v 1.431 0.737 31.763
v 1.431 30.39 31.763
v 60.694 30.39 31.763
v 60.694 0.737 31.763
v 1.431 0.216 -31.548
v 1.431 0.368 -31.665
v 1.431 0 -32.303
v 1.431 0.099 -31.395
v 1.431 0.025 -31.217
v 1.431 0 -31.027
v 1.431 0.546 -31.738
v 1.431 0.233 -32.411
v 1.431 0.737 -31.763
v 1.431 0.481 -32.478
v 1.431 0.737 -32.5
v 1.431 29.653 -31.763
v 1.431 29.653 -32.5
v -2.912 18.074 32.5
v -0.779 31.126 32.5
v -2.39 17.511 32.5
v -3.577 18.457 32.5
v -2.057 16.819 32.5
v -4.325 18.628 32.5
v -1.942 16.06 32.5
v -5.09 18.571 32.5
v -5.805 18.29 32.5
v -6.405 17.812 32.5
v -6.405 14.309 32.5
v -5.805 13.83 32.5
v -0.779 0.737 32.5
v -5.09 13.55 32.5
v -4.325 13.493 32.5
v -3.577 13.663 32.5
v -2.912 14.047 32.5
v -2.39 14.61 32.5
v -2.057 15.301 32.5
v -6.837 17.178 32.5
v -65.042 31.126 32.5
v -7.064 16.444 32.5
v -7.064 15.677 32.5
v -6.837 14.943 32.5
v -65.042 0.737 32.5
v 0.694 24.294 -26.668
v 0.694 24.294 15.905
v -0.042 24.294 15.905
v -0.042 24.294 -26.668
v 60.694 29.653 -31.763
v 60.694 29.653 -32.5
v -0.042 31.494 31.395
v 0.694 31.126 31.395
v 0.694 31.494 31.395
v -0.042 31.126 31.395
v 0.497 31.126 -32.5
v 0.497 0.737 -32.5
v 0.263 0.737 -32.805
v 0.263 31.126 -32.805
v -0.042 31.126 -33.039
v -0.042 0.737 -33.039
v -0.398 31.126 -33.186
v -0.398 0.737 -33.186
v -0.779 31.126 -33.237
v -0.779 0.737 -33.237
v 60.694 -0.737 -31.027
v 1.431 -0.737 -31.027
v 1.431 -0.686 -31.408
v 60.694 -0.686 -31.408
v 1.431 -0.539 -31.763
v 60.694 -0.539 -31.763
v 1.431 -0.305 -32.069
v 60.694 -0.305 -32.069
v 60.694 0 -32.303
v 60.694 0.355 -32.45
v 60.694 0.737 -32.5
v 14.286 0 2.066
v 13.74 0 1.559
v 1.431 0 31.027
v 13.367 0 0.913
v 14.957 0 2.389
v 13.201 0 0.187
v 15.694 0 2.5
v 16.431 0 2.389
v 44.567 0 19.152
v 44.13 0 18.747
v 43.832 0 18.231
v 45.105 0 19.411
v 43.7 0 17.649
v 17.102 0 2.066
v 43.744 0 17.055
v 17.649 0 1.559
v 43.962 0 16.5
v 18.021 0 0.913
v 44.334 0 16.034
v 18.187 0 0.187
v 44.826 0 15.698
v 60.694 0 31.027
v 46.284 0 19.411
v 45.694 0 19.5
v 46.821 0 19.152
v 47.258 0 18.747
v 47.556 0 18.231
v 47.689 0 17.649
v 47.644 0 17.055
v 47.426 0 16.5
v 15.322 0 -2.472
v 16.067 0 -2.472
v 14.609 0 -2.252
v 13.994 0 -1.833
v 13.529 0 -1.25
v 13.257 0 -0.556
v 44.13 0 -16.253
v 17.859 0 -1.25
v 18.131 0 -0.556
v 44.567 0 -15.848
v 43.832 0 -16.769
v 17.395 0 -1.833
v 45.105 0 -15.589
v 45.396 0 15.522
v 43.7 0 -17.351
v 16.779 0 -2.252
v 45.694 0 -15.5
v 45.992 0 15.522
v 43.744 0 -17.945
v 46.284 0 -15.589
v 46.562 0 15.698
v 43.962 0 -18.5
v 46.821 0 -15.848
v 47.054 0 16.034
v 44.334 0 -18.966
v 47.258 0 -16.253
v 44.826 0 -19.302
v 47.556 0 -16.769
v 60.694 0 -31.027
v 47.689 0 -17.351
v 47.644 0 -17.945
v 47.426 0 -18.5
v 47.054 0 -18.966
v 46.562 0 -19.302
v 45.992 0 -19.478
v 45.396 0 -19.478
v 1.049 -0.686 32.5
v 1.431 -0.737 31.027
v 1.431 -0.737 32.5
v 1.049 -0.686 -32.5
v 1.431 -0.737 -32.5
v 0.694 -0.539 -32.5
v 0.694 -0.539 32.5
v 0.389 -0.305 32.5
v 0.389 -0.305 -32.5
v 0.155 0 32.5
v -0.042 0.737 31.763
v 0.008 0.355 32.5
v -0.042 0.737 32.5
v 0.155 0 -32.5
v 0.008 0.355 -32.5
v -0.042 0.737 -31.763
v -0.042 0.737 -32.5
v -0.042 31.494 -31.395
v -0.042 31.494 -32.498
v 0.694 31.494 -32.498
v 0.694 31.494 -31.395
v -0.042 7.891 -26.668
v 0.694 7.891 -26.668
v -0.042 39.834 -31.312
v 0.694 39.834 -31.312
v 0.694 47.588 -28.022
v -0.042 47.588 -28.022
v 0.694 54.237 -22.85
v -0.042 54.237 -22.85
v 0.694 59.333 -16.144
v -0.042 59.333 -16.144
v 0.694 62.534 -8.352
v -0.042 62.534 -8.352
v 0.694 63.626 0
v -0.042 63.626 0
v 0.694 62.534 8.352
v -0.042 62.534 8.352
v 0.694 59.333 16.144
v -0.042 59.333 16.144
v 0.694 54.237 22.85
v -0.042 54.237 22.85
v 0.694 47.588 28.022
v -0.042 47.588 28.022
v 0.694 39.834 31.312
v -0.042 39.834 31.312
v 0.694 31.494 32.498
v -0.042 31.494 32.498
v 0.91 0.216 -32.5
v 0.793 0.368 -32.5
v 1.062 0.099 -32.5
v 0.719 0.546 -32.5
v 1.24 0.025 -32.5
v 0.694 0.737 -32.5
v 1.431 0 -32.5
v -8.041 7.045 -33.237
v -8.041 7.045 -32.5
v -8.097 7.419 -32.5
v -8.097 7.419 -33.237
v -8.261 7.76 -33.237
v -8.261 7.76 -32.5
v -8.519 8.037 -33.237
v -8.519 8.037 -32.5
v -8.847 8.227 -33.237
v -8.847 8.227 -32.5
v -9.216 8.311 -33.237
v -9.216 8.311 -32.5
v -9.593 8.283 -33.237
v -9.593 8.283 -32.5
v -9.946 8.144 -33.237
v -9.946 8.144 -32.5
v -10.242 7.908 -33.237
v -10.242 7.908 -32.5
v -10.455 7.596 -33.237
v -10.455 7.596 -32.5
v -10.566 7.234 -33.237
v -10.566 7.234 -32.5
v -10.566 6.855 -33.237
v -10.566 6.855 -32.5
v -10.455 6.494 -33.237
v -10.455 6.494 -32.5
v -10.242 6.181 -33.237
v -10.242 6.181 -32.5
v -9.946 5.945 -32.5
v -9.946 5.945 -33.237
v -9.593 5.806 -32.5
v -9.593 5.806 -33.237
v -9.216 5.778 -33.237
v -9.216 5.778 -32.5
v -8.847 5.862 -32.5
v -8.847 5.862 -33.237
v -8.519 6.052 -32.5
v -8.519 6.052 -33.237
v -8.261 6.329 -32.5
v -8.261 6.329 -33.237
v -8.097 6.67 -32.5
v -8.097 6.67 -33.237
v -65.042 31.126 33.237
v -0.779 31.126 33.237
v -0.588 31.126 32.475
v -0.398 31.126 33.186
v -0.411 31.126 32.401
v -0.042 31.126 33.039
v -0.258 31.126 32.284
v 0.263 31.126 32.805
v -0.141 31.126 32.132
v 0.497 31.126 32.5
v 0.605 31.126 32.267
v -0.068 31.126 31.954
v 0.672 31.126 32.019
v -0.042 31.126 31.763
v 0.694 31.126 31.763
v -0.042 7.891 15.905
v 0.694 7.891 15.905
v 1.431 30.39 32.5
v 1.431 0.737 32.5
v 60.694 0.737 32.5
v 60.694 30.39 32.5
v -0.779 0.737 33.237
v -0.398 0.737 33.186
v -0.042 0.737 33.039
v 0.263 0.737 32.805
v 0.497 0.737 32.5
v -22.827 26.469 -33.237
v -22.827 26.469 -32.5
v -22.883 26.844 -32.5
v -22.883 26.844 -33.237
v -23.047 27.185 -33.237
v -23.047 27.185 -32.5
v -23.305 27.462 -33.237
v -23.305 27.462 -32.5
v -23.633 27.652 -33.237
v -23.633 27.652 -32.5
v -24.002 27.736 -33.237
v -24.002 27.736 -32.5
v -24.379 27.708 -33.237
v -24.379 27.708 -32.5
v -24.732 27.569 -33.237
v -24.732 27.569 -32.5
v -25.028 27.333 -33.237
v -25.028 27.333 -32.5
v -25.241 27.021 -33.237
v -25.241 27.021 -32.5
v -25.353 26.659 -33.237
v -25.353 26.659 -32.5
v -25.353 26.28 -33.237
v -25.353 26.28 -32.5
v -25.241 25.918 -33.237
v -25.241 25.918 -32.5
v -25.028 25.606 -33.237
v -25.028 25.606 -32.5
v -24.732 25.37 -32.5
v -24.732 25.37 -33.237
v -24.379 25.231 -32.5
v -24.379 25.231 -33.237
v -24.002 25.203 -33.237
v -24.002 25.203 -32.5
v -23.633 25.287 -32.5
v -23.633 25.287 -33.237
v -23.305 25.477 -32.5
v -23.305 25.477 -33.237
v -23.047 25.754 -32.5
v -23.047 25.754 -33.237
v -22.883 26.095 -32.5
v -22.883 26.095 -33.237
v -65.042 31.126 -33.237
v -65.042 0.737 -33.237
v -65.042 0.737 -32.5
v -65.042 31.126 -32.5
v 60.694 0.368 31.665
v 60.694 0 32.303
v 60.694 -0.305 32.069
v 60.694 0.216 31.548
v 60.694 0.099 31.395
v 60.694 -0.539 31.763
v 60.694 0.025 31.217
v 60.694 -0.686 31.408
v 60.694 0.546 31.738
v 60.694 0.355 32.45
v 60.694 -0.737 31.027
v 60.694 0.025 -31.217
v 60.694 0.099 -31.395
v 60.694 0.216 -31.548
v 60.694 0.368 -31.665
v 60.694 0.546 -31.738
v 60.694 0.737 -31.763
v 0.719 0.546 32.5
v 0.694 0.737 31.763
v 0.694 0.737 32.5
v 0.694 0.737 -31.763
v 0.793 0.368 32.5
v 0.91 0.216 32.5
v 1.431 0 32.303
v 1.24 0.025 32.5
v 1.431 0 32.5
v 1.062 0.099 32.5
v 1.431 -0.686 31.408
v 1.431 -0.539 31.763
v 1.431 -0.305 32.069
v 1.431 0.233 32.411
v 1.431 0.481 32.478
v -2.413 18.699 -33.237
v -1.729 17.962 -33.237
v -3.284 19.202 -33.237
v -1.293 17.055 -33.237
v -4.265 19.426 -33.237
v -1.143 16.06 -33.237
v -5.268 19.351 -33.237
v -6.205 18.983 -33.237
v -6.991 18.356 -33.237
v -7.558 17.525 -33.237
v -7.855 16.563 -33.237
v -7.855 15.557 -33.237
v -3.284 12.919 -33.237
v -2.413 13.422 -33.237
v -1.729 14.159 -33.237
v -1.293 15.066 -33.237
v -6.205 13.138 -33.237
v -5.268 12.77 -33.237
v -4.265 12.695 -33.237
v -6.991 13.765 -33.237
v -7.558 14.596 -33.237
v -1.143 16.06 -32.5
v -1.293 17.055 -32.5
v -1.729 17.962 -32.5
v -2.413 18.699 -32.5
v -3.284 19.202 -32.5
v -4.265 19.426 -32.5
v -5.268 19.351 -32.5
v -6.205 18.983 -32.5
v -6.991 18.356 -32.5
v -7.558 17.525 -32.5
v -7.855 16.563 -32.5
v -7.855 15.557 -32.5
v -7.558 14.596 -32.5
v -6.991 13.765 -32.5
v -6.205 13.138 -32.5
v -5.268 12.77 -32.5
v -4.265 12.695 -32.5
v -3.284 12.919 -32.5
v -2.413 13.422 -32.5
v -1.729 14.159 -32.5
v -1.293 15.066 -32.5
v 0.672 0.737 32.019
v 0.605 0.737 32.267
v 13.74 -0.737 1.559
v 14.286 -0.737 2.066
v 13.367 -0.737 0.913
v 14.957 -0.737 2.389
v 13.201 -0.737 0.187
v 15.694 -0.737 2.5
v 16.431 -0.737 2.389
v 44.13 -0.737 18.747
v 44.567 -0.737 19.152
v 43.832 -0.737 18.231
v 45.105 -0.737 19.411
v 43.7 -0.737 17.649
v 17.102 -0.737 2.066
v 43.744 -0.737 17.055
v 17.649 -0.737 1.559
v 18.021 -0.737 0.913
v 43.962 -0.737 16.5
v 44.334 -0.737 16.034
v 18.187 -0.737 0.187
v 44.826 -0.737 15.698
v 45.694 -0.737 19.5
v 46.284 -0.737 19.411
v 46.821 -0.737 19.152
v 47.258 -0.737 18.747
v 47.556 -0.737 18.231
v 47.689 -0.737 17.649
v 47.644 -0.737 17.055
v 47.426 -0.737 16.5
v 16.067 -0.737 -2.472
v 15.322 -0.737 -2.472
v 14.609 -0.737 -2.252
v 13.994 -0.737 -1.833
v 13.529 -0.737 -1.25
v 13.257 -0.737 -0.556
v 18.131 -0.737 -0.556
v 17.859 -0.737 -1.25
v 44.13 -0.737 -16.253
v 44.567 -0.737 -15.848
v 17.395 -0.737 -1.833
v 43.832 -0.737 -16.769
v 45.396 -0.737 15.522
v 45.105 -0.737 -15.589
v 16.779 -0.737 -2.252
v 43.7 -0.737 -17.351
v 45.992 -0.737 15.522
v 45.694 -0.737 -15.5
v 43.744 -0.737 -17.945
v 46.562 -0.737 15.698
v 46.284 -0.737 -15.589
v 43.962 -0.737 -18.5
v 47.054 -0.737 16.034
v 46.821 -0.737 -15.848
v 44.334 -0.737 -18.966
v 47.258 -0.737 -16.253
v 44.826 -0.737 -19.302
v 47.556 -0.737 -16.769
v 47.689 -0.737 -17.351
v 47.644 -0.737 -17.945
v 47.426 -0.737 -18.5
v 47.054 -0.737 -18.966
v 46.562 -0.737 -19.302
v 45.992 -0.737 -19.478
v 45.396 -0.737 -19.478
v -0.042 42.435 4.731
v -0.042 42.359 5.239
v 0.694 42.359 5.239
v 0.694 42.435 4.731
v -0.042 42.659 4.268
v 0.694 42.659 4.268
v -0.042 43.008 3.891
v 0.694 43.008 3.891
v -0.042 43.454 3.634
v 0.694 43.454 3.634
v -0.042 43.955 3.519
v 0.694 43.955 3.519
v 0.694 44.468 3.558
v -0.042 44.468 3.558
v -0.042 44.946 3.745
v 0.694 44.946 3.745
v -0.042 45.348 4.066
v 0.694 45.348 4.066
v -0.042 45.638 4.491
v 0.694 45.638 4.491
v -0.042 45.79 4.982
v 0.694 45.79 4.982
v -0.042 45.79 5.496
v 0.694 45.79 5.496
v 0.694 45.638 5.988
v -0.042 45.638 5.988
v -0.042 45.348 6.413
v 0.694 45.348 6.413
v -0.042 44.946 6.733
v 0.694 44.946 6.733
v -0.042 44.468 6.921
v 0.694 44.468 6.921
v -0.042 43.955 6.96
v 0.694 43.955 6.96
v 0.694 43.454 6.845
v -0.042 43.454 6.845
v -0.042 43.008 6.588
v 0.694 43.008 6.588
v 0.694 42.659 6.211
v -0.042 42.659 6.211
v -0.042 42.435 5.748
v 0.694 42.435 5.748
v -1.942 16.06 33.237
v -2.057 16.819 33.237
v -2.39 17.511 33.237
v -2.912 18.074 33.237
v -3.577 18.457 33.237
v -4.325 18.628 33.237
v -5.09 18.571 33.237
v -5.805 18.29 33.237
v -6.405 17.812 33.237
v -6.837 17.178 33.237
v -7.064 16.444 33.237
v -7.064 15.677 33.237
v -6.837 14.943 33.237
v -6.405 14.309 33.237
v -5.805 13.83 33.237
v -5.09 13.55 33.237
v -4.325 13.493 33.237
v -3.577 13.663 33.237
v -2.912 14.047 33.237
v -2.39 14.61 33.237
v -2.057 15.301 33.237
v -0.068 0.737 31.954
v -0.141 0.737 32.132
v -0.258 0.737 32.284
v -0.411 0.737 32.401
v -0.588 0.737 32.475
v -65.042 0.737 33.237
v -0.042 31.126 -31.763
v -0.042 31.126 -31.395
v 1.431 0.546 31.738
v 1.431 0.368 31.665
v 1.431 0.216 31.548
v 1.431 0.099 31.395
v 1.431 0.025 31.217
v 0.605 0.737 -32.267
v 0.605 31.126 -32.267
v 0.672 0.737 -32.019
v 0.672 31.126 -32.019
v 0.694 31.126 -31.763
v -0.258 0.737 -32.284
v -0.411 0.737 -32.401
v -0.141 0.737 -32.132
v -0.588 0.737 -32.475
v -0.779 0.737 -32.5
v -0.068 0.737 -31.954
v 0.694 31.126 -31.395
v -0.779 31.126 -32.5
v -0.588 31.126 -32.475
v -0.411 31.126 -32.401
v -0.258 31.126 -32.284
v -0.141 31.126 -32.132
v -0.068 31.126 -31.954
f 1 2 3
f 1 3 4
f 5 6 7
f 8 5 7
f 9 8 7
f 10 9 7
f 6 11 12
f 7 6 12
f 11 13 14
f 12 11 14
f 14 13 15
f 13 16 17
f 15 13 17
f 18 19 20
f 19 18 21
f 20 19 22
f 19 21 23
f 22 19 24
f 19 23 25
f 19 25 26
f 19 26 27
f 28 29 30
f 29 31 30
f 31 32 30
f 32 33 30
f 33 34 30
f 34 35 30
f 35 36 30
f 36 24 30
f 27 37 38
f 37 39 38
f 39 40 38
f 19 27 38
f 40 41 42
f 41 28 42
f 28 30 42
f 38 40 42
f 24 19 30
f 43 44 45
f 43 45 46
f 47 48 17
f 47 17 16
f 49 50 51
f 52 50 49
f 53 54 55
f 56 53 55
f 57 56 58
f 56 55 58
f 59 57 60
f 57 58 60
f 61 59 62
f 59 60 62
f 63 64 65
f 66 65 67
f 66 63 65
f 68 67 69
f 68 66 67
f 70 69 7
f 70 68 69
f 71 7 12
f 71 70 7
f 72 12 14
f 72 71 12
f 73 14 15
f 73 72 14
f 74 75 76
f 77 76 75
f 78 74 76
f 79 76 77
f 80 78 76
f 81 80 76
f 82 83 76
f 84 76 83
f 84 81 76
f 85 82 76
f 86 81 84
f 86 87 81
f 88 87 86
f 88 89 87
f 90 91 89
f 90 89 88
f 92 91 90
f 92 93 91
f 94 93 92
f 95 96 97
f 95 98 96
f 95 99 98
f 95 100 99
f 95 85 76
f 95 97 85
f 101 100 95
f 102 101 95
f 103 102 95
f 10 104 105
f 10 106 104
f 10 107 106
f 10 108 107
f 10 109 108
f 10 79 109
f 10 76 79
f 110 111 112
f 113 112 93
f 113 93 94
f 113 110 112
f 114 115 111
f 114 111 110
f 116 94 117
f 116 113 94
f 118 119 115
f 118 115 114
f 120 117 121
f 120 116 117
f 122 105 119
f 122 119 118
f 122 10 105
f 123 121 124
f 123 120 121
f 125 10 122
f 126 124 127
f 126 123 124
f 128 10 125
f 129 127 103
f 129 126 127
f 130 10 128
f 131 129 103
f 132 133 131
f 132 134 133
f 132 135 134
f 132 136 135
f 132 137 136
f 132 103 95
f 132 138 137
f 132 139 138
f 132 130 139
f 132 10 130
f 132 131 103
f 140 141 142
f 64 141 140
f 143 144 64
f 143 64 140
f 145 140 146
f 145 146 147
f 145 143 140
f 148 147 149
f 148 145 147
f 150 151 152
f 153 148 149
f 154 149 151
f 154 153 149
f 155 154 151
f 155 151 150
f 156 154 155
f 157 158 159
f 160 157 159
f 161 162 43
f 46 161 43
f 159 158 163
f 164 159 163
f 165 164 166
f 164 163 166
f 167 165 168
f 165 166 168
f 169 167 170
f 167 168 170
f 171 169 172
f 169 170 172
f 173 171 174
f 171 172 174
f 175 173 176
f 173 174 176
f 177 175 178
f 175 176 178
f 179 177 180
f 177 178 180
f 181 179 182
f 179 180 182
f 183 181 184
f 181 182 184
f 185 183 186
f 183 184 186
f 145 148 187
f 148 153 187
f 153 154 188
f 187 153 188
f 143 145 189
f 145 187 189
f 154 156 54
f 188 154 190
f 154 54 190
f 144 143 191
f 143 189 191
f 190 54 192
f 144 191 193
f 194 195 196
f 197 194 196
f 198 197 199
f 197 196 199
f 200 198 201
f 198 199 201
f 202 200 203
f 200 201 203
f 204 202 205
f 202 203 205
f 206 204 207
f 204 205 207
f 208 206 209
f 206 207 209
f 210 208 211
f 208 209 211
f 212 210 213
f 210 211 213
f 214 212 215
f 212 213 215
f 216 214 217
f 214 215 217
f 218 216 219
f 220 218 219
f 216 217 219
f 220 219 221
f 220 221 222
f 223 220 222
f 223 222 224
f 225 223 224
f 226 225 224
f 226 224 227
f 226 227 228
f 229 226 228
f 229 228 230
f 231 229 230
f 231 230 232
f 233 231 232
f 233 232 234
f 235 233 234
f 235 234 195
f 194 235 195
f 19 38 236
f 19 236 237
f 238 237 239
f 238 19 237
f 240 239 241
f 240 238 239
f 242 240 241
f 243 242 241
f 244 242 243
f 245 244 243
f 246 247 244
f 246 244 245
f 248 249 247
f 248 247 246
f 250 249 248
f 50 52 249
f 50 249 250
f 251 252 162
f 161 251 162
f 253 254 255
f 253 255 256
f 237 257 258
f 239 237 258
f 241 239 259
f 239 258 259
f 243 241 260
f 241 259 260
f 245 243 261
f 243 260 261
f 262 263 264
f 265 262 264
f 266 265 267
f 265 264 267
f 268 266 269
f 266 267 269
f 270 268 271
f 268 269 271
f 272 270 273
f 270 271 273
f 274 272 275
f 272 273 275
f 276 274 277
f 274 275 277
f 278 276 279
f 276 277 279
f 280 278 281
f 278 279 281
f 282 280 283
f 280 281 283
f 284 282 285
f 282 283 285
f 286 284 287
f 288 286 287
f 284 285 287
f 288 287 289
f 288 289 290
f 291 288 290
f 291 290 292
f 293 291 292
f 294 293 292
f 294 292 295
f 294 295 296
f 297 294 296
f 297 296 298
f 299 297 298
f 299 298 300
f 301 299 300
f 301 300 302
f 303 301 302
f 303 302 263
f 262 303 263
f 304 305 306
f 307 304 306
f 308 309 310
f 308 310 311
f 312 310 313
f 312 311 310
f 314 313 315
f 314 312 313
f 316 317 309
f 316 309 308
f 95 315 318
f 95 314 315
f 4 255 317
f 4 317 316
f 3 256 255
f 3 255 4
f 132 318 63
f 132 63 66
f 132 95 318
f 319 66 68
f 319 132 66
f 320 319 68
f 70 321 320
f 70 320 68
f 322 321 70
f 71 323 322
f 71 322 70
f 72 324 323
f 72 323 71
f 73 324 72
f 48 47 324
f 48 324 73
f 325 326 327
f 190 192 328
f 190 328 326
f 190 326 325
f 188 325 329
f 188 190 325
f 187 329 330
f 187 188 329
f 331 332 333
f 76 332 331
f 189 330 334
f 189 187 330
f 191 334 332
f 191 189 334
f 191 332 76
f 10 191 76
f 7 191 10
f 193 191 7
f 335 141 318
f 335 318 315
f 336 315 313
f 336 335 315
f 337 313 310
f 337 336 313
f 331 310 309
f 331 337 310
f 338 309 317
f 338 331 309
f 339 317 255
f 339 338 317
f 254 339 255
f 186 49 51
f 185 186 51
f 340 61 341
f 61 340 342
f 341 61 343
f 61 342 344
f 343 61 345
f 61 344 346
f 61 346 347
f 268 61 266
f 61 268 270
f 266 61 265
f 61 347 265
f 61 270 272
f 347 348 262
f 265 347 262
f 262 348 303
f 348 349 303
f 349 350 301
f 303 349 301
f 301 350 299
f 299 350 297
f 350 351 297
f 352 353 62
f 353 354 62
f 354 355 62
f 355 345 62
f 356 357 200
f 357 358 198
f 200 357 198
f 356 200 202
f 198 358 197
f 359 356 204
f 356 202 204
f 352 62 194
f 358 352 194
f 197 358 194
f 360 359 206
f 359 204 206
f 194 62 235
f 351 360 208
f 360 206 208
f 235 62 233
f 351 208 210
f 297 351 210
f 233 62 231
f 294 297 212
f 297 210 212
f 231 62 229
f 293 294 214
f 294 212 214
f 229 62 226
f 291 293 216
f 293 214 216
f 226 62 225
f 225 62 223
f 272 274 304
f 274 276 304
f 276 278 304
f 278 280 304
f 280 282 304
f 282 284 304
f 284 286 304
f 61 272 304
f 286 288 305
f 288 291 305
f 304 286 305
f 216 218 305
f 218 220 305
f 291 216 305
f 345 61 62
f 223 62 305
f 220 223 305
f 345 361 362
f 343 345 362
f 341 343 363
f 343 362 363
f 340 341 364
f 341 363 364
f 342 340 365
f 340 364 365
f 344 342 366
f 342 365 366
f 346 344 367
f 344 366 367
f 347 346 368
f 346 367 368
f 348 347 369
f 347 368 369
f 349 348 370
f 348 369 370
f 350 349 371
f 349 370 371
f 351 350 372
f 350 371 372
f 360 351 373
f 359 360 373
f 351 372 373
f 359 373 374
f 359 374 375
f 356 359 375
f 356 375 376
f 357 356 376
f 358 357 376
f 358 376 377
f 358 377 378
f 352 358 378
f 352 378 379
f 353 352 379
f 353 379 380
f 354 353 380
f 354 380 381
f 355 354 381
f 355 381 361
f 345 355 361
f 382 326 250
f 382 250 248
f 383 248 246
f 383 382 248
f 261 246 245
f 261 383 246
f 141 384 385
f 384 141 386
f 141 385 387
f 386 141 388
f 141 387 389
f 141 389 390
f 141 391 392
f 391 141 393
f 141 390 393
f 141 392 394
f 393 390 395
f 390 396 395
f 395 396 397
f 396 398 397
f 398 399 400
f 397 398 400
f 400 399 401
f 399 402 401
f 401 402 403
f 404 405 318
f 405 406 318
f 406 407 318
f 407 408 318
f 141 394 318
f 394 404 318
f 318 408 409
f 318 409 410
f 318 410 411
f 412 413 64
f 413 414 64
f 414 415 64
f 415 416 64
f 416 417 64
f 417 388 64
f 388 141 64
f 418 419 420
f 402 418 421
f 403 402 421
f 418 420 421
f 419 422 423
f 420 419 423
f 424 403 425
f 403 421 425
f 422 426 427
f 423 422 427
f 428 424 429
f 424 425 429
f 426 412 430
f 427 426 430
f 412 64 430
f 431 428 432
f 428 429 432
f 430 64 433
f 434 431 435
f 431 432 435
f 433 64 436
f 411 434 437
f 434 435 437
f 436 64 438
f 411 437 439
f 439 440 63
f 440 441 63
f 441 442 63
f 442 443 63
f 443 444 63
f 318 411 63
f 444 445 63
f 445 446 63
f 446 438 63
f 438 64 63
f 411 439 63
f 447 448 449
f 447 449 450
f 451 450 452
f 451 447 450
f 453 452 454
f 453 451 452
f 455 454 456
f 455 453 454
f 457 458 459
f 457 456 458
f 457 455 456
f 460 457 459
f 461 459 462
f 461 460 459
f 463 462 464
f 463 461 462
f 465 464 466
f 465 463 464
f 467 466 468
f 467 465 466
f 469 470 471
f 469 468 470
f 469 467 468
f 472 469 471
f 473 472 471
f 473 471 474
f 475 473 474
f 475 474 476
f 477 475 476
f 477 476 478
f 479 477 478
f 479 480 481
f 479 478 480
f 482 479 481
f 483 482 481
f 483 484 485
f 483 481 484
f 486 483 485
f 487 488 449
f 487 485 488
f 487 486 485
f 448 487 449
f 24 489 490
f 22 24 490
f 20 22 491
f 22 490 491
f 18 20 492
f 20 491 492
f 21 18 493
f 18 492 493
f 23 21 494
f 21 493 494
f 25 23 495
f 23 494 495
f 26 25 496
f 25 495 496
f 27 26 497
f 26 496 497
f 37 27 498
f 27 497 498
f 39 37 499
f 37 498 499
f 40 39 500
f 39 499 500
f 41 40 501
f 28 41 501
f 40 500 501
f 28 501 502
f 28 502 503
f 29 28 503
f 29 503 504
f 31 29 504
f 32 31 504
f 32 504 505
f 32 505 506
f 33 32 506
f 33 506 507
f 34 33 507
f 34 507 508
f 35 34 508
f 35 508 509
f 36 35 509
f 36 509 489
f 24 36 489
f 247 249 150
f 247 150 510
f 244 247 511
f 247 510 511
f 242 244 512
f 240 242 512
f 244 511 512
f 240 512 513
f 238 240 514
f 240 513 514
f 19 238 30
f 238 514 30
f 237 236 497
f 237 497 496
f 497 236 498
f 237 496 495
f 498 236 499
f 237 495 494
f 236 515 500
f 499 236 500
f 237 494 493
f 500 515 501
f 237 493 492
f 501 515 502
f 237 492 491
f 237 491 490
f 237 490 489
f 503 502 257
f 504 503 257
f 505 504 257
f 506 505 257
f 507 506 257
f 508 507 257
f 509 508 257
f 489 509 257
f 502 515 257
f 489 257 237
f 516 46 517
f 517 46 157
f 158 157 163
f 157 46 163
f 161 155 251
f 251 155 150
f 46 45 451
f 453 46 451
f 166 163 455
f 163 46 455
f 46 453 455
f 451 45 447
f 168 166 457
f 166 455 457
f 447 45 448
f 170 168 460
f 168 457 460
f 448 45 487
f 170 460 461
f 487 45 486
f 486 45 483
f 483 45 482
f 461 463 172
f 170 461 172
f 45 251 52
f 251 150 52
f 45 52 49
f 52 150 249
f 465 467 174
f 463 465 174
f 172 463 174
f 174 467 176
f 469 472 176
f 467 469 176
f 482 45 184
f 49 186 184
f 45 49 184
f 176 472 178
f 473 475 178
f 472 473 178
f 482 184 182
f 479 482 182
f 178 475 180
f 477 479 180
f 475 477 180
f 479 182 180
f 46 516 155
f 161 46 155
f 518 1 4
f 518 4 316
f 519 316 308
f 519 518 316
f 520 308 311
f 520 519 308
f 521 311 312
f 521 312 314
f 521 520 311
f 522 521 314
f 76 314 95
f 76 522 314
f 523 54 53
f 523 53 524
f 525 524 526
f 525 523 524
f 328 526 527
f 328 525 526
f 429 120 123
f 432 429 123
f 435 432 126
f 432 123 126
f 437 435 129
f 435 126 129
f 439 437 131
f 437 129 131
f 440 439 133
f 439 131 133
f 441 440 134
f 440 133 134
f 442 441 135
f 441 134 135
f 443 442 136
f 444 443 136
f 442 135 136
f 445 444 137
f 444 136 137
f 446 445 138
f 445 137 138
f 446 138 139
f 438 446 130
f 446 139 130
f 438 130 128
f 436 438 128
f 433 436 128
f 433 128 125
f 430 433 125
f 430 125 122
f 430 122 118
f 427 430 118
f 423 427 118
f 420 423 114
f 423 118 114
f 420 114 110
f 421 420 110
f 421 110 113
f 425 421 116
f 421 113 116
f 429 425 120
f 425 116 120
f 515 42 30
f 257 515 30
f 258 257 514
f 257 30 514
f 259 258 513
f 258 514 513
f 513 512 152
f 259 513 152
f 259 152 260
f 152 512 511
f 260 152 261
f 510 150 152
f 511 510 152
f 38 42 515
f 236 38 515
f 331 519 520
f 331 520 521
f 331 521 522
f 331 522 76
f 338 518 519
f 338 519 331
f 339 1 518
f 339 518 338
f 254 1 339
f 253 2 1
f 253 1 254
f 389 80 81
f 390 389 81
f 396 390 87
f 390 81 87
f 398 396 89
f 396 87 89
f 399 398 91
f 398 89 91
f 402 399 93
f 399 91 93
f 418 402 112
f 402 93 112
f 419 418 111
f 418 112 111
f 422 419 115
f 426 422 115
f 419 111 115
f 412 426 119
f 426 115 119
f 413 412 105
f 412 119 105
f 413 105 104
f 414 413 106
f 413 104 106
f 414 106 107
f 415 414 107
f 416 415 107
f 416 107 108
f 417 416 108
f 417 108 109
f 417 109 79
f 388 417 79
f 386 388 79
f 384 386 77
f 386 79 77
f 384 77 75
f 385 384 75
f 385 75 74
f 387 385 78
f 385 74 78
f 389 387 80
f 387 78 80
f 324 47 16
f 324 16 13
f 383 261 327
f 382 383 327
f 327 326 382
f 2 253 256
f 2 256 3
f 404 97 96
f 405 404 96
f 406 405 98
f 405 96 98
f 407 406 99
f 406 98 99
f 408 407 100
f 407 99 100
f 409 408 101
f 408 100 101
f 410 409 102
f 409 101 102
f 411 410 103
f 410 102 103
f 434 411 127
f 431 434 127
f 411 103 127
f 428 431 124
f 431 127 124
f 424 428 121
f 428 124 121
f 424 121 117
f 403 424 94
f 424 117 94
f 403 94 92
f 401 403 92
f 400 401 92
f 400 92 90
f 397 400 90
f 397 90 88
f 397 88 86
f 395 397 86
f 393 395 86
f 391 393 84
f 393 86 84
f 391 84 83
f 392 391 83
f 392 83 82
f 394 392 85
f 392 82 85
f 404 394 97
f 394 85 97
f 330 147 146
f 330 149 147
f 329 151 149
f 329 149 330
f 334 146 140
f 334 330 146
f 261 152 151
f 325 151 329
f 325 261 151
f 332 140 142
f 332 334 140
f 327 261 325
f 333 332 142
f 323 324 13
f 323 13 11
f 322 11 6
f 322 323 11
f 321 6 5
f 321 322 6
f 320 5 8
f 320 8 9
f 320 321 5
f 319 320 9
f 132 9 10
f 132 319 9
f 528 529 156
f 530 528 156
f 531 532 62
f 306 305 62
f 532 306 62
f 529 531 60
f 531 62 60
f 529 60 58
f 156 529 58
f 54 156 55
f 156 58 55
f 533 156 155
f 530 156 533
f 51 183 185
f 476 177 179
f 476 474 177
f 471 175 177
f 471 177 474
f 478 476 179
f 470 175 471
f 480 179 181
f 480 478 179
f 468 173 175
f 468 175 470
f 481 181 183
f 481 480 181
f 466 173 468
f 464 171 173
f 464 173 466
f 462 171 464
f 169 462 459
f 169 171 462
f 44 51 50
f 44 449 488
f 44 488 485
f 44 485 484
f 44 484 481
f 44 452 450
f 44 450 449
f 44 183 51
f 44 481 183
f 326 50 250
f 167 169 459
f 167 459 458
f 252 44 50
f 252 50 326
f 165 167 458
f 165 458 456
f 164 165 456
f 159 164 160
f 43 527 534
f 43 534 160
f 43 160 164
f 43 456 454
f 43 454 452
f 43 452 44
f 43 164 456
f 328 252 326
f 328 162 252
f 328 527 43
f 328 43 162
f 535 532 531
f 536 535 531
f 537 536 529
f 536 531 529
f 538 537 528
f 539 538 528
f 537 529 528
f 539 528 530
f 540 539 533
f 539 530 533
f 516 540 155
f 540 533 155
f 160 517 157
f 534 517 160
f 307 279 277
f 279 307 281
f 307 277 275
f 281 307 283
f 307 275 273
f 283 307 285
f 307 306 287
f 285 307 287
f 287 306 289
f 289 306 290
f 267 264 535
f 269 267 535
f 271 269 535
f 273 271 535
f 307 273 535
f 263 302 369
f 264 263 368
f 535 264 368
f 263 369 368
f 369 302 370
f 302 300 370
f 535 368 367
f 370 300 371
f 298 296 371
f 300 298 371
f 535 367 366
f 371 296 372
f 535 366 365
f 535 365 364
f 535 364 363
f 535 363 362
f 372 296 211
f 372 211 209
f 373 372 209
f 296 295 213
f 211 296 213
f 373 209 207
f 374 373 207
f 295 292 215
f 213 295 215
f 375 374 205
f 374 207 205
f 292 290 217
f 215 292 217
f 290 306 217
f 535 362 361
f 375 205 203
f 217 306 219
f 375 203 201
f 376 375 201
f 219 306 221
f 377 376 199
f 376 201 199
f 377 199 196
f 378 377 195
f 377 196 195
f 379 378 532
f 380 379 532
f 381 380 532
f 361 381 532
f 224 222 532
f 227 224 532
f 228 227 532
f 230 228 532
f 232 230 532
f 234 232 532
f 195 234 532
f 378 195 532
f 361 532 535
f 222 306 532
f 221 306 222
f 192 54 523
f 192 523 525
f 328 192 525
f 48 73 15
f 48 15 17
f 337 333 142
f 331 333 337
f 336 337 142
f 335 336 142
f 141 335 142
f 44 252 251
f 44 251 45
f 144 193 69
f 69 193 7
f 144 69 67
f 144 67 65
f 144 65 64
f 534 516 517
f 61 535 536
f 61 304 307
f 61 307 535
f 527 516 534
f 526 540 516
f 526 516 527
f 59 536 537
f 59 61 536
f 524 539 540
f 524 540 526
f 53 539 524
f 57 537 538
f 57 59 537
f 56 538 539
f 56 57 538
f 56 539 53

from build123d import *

# Parameters (mm, degrees)
SKETCH1_R                    = 2.5
BASE_FLANGE3_DEPTH           = 0.7366
SKETCHED_START               = -64
SKETCHED_BEND1_OUTLINE_W     = 0.7366
SKETCHED_BEND1_OUTLINE_H     = 65
SKETCHED_BEND1_DEPTH         = 64.108877104
SKETCHED_START_2             = 0.168203781
SKETCHED_BEND1_2_DEPTH       = 0.525916755
SKETCHED_START_3             = -0.042479464
SKETCHED_BEND1_3_DEPTH       = 1.4732
SKETCHED_START_4             = -32.5
SKETCHED_BEND1_4_DEPTH       = 65
EDGE_FLANGE1_START           = 0.7366
EDGE_FLANGE1_DEPTH           = 30.75756821
EDGE_FLANGE1_START_2         = 31.12586821
EDGE_FLANGE1_2_DEPTH         = 0.3683
EDGE_FLANGE1_3_DEPTH         = 30.38926821
SKETCH19_R                   = 1.27
SKETCH19_R_2                 = 3.3749
CUT_EXTRUDE5_DEPTH           = 112.820280988
SKETCH20_W                   = 42.572846016
SKETCH20_H                   = 16.402646855
CUT_EXTRUDE6_DEPTH           = 98.335621766
EDGE_FLANGE2_START           = 0.7366
EDGE_FLANGE2_DEPTH           = 30.75756821
EDGE_FLANGE2_START_2         = 31.12586821
EDGE_FLANGE2_2_DEPTH         = 0.3683
EDGE_FLANGE2_3_DEPTH         = 30.38926821
SKETCH27_R                   = 2.575
CUT_EXTRUDE7_DEPTH           = 10
CUT_EXTRUDE8_DEPTH           = 98.335621766
CUT_EXTRUDE8_DEPTH_BACK      = 98.335621766
SKETCH28_R                   = 1.725
SKETCH33_W                   = 30
SKETCH33_H                   = 65
SKETCH33_R                   = 2
TAB1_DEPTH                   = 0.7366
EDGE_FLANGE3_STRIP_W         = 4.4196
EDGE_FLANGE3_STRIP_H         = 0.7366
EDGE_FLANGE3_STRIP_CUT_DEPTH = 59.2634
EDGE_FLANGE3_DEPTH           = 59.2634
EDGE_FLANGE4_STRIP_W         = 4.4196
EDGE_FLANGE4_STRIP_H         = 0.7366
EDGE_FLANGE4_STRIP_CUT_DEPTH = 59.2634
EDGE_FLANGE4_DEPTH           = 59.2634


with BuildPart() as part:
    # Base-Flange3: sheet metal written as solids
    # Sketch1 → Base-Flange3 (new body)
    with BuildSketch(Plane(origin=(0, 0, 0), x_dir=(1, 0, 0), z_dir=(0, 1, 0))):
        with BuildLine():
            Line((-30.694120536, 32.5), (30.694120536, 32.5))
            Line((30.694120536, 32.5), (30.694120536, -32.5))
            Line((30.694120536, -32.5), (-30.694120536, -32.5))
            ThreePointArc((-30.694120536, -32.5), (-63.194120536, 0), (-30.694120536, 32.5))
        make_face()
        with Locations(Location((15.694120536, 0, 0), (0, 0, 270))):
            Circle(SKETCH1_R, mode=Mode.SUBTRACT)
    extrude(amount=-BASE_FLANGE3_DEPTH)

    # Sketched Bend1: read off the stored shape, not the designer's step
    # Sketched Bend1 outline → Sketched Bend1 (cut)
    with BuildSketch(Plane.YZ.offset(SKETCHED_START)):
        with Locations((-0.3683, 0)):
            Rectangle(SKETCHED_BEND1_OUTLINE_W, SKETCHED_BEND1_OUTLINE_H)
    extrude(amount=SKETCHED_BEND1_DEPTH, mode=Mode.SUBTRACT)

    # Sketched Bend1 2 outline → Sketched Bend1 2 (add)
    with BuildSketch(Plane.YZ.offset(SKETCHED_START_2)):
        with BuildLine():
            ThreePointArc((31.12586821, -32.5), (63.62586821, 0), (31.12586821, 32.5))
            Line((31.12586821, 32.5), (0, 32.5))
            Line((0, 32.5), (0, -32.5))
            Line((0, -32.5), (31.12586821, -32.5))
        make_face()
    extrude(amount=SKETCHED_BEND1_2_DEPTH)

    # Sketched Bend1 3 outline → Sketched Bend1 3 (add)
    with BuildSketch(Plane.YZ.offset(SKETCHED_START_3)):
        with BuildLine():
            ThreePointArc((31.12586821, -32.5), (63.62586821, 0), (31.12586821, 32.5))
            Line((31.12586821, 32.5), (0, 32.5))
            Line((0, 32.5), (0, -32.5))
            Line((0, -32.5), (31.12586821, -32.5))
        make_face()
    extrude(amount=SKETCHED_BEND1_3_DEPTH)

    # Sketched Bend1 4 outline → Sketched Bend1 4 (cut)
    with BuildSketch(Plane.XY.offset(SKETCHED_START_4)):
        with BuildLine():
            Line((0.694120536, 65), (0.694120536, 0.7366))
            ThreePointArc((0.694120536, 0.7366), (0.90986568, 0.215745144), (1.430720536, 0))
            Line((1.430720536, 0), (1.430720536, 65))
            Line((1.430720536, 65), (0.694120536, 65))
        make_face()
        with BuildLine():
            Line((-0.042479464, 0.7366), (-0.042479396, 65))
            Line((-0.042479396, 65), (-2, 65))
            Line((-2, 65), (-2, 0))
            Line((-2, 0), (0.108877104, 0))
            Line((0.108877104, 0), (0.108877104, -2))
            Line((0.108877104, -2), (32, -2))
            Line((32, -2), (32, -0.736599968))
            Line((32, -0.736599968), (1.430720536, -0.7366))
            ThreePointArc((1.430720536, -0.7366), (0.389010825, -0.30510971), (-0.042479464, 0.7366))
        make_face()
    extrude(amount=SKETCHED_BEND1_4_DEPTH, mode=Mode.SUBTRACT)

    # Edge-Flange1: read off the stored shape, not the designer's step
    # Edge-Flange1 outline → Edge-Flange1 (cut)
    with BuildSketch(Plane(origin=(0, 0, 0), x_dir=(1, 0, 0), z_dir=(0, 1, 0)).offset(EDGE_FLANGE1_START)):
        with BuildLine():
            ThreePointArc((0.496749161, 32.5), (0.643922463, 32.144692217), (0.694120536, 31.7634))
            Line((0.694120536, 31.7634), (0.694120536, 32.5))
            Line((0.694120536, 32.5), (0.496749161, 32.5))
        make_face()
    extrude(amount=EDGE_FLANGE1_DEPTH, mode=Mode.SUBTRACT)

    # Edge-Flange1 2 outline → Edge-Flange1 2 (cut)
    with BuildSketch(Plane(origin=(0, 0, 0), x_dir=(1, 0, 0), z_dir=(0, 1, 0)).offset(EDGE_FLANGE1_START_2)):
        with BuildLine():
            Line((-0.042479464, 31.3951), (0.694120536, 31.3951))
            Line((0.694120536, 31.3951), (0.694120536, 31.7634))
            ThreePointArc((0.694120536, 31.7634), (0.643922463, 32.144692217), (0.496749161, 32.5))
            Line((0.496749161, 32.5), (-0.042479464, 32.5))
            Line((-0.042479464, 32.5), (-0.042479464, 31.3951))
        make_face()
    extrude(amount=EDGE_FLANGE1_2_DEPTH, mode=Mode.SUBTRACT)

    # Edge-Flange1 3 outline → Edge-Flange1 3 (add)
    with BuildSketch(Plane(origin=(0, 0, 0), x_dir=(1, 0, 0), z_dir=(0, 1, 0)).offset(EDGE_FLANGE1_START)):
        with BuildLine():
            ThreePointArc((-0.779079464, 32.5), (-0.258224609, 32.284254855), (-0.042479464, 31.7634))
            Line((-0.042479464, 31.7634), (-0.042479464, 32.5))
            Line((-0.042479464, 32.5), (0.496749161, 32.5))
            ThreePointArc((0.496749161, 32.5), (-0.042479464, 33.039228625), (-0.779079464, 33.2366))
            Line((-0.779079464, 33.2366), (-65.042479464, 33.2366))
            Line((-65.042479464, 33.2366), (-65.042479464, 32.5))
            Line((-65.042479464, 32.5), (-0.779079464, 32.5))
        make_face()
    extrude(amount=EDGE_FLANGE1_3_DEPTH)

    # Sketch19 → Cut-Extrude5 (cut, through all)
    with BuildSketch(Plane.XY.offset(-32.5)):
        with Locations((-24.096722092, 26.469477583)):
            Circle(SKETCH19_R)
        with Locations((-9.310652066, 7.044552475)):
            Circle(SKETCH19_R)
        with Locations((-4.517479464, 16.06042365)):
            Circle(SKETCH19_R_2)
    extrude(amount=-CUT_EXTRUDE5_DEPTH, mode=Mode.SUBTRACT)

    # Sketch20 → Cut-Extrude6 (cut, through all)
    with BuildSketch(Plane(origin=(0.694120536, 0, 0), x_dir=(0, 0, -1), z_dir=(1, 0, 0))):
        with Locations((5.381444798, 16.092801871)):
            Rectangle(SKETCH20_W, SKETCH20_H)
    extrude(amount=-CUT_EXTRUDE6_DEPTH, mode=Mode.SUBTRACT)

    # Edge-Flange2: read off the stored shape, not the designer's step
    # Edge-Flange2 outline → Edge-Flange2 (cut)
    with BuildSketch(Plane(origin=(0, 0, 0), x_dir=(1, 0, 0), z_dir=(0, 1, 0)).offset(EDGE_FLANGE2_START)):
        with BuildLine():
            ThreePointArc((0.694120536, -31.7634), (0.643922463, -32.144692217), (0.496749161, -32.5))
            Line((0.496749161, -32.5), (0.694120536, -32.5))
            Line((0.694120536, -32.5), (0.694120536, -31.7634))
        make_face()
    extrude(amount=EDGE_FLANGE2_DEPTH, mode=Mode.SUBTRACT)

    # Edge-Flange2 2 outline → Edge-Flange2 2 (cut)
    with BuildSketch(Plane(origin=(0, 0, 0), x_dir=(1, 0, 0), z_dir=(0, 1, 0)).offset(EDGE_FLANGE2_START_2)):
        with BuildLine():
            Line((-0.042479464, -31.3951), (-0.042479464, -32.5))
            Line((-0.042479464, -32.5), (0.496749161, -32.5))
            ThreePointArc((0.496749161, -32.5), (0.643922463, -32.144692217), (0.694120536, -31.7634))
            Line((0.694120536, -31.7634), (0.694120536, -31.3951))
            Line((0.694120536, -31.3951), (-0.042479464, -31.3951))
        make_face()
    extrude(amount=EDGE_FLANGE2_2_DEPTH, mode=Mode.SUBTRACT)

    # Edge-Flange2 3 outline → Edge-Flange2 3 (add)
    with BuildSketch(Plane(origin=(0, 0, 0), x_dir=(1, 0, 0), z_dir=(0, 1, 0)).offset(EDGE_FLANGE2_START)):
        with BuildLine():
            Line((-0.779079464, -32.5), (-65.042479464, -32.5))
            Line((-65.042479464, -32.5), (-65.042479464, -33.2366))
            Line((-65.042479464, -33.2366), (-0.779079464, -33.2366))
            ThreePointArc((-0.779079464, -33.2366), (-0.042479464, -33.039228625), (0.496749161, -32.5))
            Line((0.496749161, -32.5), (-0.042479464, -32.5))
            Line((-0.042479464, -32.5), (-0.042479464, -31.7634))
            ThreePointArc((-0.042479464, -31.7634), (-0.258224609, -32.284254855), (-0.779079464, -32.5))
        make_face()
    extrude(amount=EDGE_FLANGE2_3_DEPTH)

    # Sketch27 → Cut-Extrude7 (cut)
    with BuildSketch(Plane.XY.offset(38.8834)):
        with Locations((-4.517479464, 16.06042365)):
            Circle(SKETCH27_R)
    extrude(amount=-CUT_EXTRUDE7_DEPTH, mode=Mode.SUBTRACT)

    # Sketch28 → Cut-Extrude8 (cut, two sides: drawn at the far end of the back side and taken through both)
    with BuildSketch(Plane(origin=(0.694120536, 0, 0), x_dir=(0, 0, -1), z_dir=(1, 0, 0)).offset(-CUT_EXTRUDE8_DEPTH_BACK)):
        with Locations(Location((-5.239369246, 44.083803898, 0), (0, 0, 270))):
            Circle(SKETCH28_R)
    extrude(amount=CUT_EXTRUDE8_DEPTH + CUT_EXTRUDE8_DEPTH_BACK, mode=Mode.SUBTRACT)

    # Tab1: sheet metal written as solids
    # Sketch33 → Tab1 (add)
    with BuildSketch(Plane(origin=(0, 0, 0), x_dir=(1, 0, 0), z_dir=(0, 1, 0))):
        with Locations((45.694120536, 0)):
            Rectangle(SKETCH33_W, SKETCH33_H)
        with Locations(Location((45.694120536, 17.5, 0), (0, 0, 270))):
            Circle(SKETCH33_R, mode=Mode.SUBTRACT)
        with Locations(Location((45.694120536, -17.5, 0), (0, 0, 270))):
            Circle(SKETCH33_R, mode=Mode.SUBTRACT)
    extrude(amount=-TAB1_DEPTH)

    # Edge-Flange3: sheet metal written as solids
    # Edge-Flange3 strip (on a plane across the edge) → Edge-Flange3 strip cut (cut)
    with BuildSketch(Plane(origin=(1.430720536, 0, 32.5), x_dir=(0, 0, -1), z_dir=(1, 0, 0))):
        with Locations((-0.7366, -0.3683)):
            Rectangle(EDGE_FLANGE3_STRIP_W, EDGE_FLANGE3_STRIP_H)
    extrude(amount=EDGE_FLANGE3_STRIP_CUT_DEPTH, mode=Mode.SUBTRACT)

    # Edge-Flange3 section (on a plane across the edge) → Edge-Flange3 (add)
    with BuildSketch(Plane(origin=(1.430720536, 0, 32.5), x_dir=(0, 0, -1), z_dir=(1, 0, 0))):
        with BuildLine():
            Line((0, 0.7366), (0, 30.39))
            Line((0, 30.39), (0.7366, 30.39))
            Line((0.7366, 30.39), (0.7366, 0.7366))
            ThreePointArc((0.7366, 0.7366), (0.952345145, 0.215745145), (1.4732, 0))
            Line((1.4732, 0), (1.4732, -0.7366))
            ThreePointArc((1.4732, -0.7366), (0.43149029, -0.30510971), (0, 0.7366))
        make_face()
    extrude(amount=EDGE_FLANGE3_DEPTH)

    # Edge-Flange4: sheet metal written as solids
    # Edge-Flange4 strip (on a plane across the edge) → Edge-Flange4 strip cut (cut)
    with BuildSketch(Plane(origin=(60.694120536, 0, -32.5), x_dir=(0, 0, 1), z_dir=(-1, 0, 0))):
        with Locations((-0.7366, -0.3683)):
            Rectangle(EDGE_FLANGE4_STRIP_W, EDGE_FLANGE4_STRIP_H)
    extrude(amount=EDGE_FLANGE4_STRIP_CUT_DEPTH, mode=Mode.SUBTRACT)

    # Edge-Flange4 section (on a plane across the edge) → Edge-Flange4 (add)
    with BuildSketch(Plane(origin=(60.694120536, 0, -32.5), x_dir=(0, 0, 1), z_dir=(-1, 0, 0))):
        with BuildLine():
            Line((0, 0.7366), (0, 29.6534))
            Line((0, 29.6534), (0.7366, 29.6534))
            Line((0.7366, 29.6534), (0.7366, 0.7366))
            ThreePointArc((0.7366, 0.7366), (0.952345145, 0.215745145), (1.4732, 0))
            Line((1.4732, 0), (1.4732, -0.7366))
            ThreePointArc((1.4732, -0.7366), (0.43149029, -0.30510971), (0, 0.7366))
        make_face()
    extrude(amount=EDGE_FLANGE4_DEPTH)


solid = part.part
